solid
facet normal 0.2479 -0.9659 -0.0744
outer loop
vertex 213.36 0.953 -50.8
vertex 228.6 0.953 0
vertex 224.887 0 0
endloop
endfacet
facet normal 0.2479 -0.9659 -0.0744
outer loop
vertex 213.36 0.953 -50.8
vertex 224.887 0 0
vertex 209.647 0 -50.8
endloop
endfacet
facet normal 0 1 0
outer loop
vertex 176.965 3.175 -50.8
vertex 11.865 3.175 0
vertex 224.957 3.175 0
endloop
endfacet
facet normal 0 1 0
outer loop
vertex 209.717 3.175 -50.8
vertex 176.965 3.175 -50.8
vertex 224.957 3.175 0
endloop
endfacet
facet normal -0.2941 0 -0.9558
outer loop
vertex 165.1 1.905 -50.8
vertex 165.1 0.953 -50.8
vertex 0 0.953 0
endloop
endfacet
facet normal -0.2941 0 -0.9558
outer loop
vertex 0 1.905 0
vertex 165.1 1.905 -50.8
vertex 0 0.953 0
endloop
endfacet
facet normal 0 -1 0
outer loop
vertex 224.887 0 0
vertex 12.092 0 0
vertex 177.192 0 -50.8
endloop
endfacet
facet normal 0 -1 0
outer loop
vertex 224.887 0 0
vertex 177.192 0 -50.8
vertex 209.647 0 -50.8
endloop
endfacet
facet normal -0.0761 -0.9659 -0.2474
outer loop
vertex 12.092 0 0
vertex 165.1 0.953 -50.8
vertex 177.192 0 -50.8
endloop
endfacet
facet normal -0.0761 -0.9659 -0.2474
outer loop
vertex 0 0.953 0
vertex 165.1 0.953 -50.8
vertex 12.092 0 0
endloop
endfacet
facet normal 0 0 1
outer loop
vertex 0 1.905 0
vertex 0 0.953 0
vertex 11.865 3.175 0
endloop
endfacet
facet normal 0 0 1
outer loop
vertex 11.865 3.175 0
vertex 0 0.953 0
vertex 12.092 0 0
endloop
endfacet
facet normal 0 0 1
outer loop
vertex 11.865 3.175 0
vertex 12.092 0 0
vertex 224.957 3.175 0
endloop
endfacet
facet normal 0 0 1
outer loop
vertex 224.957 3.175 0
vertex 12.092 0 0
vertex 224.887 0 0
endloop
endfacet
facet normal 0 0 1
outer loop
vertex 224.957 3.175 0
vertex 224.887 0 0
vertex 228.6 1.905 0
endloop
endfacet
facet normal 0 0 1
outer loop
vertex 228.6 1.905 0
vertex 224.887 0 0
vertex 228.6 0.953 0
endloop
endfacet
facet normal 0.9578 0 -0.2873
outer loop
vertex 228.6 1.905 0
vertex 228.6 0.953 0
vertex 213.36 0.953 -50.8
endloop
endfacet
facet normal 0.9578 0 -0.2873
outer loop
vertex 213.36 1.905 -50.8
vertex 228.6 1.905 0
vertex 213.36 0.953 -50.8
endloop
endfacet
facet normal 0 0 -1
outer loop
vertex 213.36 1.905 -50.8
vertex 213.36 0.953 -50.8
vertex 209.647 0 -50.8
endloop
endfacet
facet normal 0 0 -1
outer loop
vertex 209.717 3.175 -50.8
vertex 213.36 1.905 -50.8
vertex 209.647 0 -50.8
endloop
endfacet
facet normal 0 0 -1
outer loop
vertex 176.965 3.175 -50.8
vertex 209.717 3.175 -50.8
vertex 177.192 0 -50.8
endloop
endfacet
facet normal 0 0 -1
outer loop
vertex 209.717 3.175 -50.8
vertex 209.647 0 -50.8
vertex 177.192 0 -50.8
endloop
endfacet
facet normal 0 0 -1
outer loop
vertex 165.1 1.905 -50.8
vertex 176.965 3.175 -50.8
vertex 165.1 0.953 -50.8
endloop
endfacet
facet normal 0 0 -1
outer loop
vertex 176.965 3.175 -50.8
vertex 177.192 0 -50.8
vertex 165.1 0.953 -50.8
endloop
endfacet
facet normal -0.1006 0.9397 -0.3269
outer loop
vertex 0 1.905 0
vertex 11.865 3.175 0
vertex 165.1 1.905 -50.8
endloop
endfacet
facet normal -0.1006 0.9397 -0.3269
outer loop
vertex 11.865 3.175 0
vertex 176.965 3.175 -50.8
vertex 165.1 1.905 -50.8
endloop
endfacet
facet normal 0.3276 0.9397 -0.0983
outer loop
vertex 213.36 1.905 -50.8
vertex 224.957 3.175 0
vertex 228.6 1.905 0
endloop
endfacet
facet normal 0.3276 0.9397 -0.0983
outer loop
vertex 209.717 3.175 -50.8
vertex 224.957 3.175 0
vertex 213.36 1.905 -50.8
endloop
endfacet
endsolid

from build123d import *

# Parameters (mm, degrees)
BOSS_EXTRUDE1_DEPTH   = 3.175
CHAMFER1_SIZE         = 1.27
CHAMFER1_SIZE2        = 3.489296323
CHAMFER1_PART_2_SIZE  = 1.27
CHAMFER1_PART_2_SIZE2 = 3.489296323
CHAMFER2_SIZE         = 3.556
CHAMFER2_SIZE2        = 0.952827328


with BuildPart() as part:
    # Sketch1 → Boss-Extrude1 (new body)
    with BuildSketch(Plane(origin=(0, 0, 0), x_dir=(1, 0, 0), z_dir=(0, 1, 0))):
        Polygon((0, 0), (228.6, 0), (213.36, 50.8), (165.1, 50.8), align=None)
    extrude(amount=BOSS_EXTRUDE1_DEPTH)

    # Chamfer1
    chamfer1_edges = [part.edges().sort_by_distance(p)[0] for p in [
        (220.98, 3.175, -25.4),
    ]]
    chamfer1_side = [part.faces().sort_by_distance(p)[0] for p in [
        (220.98, 1.5875, -25.4),
    ]]
    chamfer(chamfer1_edges, length=CHAMFER1_SIZE, length2=CHAMFER1_SIZE2, reference=chamfer1_side[0])

    # Chamfer1 part 2
    chamfer1_part_2_edges = [part.edges().sort_by_distance(p)[0] for p in [
        (82.55, 3.175, -25.4),
    ]]
    chamfer1_part_2_side = [part.faces().sort_by_distance(p)[0] for p in [
        (82.55, 1.5875, -25.4),
    ]]
    chamfer(chamfer1_part_2_edges, length=CHAMFER1_PART_2_SIZE, length2=CHAMFER1_PART_2_SIZE2, reference=chamfer1_part_2_side[0])

    # Chamfer2
    chamfer2_edges = [part.edges().sort_by_distance(p)[0] for p in [
        (220.98, 0, -25.4),
        (82.55, 0, -25.4),
    ]]
    chamfer2_side = [part.faces().sort_by_distance(p)[0] for p in [
        (143.630397554, 0, -19.885015291),
    ]]
    chamfer(chamfer2_edges, length=CHAMFER2_SIZE, length2=CHAMFER2_SIZE2, reference=chamfer2_side[0])


solid = part.part
